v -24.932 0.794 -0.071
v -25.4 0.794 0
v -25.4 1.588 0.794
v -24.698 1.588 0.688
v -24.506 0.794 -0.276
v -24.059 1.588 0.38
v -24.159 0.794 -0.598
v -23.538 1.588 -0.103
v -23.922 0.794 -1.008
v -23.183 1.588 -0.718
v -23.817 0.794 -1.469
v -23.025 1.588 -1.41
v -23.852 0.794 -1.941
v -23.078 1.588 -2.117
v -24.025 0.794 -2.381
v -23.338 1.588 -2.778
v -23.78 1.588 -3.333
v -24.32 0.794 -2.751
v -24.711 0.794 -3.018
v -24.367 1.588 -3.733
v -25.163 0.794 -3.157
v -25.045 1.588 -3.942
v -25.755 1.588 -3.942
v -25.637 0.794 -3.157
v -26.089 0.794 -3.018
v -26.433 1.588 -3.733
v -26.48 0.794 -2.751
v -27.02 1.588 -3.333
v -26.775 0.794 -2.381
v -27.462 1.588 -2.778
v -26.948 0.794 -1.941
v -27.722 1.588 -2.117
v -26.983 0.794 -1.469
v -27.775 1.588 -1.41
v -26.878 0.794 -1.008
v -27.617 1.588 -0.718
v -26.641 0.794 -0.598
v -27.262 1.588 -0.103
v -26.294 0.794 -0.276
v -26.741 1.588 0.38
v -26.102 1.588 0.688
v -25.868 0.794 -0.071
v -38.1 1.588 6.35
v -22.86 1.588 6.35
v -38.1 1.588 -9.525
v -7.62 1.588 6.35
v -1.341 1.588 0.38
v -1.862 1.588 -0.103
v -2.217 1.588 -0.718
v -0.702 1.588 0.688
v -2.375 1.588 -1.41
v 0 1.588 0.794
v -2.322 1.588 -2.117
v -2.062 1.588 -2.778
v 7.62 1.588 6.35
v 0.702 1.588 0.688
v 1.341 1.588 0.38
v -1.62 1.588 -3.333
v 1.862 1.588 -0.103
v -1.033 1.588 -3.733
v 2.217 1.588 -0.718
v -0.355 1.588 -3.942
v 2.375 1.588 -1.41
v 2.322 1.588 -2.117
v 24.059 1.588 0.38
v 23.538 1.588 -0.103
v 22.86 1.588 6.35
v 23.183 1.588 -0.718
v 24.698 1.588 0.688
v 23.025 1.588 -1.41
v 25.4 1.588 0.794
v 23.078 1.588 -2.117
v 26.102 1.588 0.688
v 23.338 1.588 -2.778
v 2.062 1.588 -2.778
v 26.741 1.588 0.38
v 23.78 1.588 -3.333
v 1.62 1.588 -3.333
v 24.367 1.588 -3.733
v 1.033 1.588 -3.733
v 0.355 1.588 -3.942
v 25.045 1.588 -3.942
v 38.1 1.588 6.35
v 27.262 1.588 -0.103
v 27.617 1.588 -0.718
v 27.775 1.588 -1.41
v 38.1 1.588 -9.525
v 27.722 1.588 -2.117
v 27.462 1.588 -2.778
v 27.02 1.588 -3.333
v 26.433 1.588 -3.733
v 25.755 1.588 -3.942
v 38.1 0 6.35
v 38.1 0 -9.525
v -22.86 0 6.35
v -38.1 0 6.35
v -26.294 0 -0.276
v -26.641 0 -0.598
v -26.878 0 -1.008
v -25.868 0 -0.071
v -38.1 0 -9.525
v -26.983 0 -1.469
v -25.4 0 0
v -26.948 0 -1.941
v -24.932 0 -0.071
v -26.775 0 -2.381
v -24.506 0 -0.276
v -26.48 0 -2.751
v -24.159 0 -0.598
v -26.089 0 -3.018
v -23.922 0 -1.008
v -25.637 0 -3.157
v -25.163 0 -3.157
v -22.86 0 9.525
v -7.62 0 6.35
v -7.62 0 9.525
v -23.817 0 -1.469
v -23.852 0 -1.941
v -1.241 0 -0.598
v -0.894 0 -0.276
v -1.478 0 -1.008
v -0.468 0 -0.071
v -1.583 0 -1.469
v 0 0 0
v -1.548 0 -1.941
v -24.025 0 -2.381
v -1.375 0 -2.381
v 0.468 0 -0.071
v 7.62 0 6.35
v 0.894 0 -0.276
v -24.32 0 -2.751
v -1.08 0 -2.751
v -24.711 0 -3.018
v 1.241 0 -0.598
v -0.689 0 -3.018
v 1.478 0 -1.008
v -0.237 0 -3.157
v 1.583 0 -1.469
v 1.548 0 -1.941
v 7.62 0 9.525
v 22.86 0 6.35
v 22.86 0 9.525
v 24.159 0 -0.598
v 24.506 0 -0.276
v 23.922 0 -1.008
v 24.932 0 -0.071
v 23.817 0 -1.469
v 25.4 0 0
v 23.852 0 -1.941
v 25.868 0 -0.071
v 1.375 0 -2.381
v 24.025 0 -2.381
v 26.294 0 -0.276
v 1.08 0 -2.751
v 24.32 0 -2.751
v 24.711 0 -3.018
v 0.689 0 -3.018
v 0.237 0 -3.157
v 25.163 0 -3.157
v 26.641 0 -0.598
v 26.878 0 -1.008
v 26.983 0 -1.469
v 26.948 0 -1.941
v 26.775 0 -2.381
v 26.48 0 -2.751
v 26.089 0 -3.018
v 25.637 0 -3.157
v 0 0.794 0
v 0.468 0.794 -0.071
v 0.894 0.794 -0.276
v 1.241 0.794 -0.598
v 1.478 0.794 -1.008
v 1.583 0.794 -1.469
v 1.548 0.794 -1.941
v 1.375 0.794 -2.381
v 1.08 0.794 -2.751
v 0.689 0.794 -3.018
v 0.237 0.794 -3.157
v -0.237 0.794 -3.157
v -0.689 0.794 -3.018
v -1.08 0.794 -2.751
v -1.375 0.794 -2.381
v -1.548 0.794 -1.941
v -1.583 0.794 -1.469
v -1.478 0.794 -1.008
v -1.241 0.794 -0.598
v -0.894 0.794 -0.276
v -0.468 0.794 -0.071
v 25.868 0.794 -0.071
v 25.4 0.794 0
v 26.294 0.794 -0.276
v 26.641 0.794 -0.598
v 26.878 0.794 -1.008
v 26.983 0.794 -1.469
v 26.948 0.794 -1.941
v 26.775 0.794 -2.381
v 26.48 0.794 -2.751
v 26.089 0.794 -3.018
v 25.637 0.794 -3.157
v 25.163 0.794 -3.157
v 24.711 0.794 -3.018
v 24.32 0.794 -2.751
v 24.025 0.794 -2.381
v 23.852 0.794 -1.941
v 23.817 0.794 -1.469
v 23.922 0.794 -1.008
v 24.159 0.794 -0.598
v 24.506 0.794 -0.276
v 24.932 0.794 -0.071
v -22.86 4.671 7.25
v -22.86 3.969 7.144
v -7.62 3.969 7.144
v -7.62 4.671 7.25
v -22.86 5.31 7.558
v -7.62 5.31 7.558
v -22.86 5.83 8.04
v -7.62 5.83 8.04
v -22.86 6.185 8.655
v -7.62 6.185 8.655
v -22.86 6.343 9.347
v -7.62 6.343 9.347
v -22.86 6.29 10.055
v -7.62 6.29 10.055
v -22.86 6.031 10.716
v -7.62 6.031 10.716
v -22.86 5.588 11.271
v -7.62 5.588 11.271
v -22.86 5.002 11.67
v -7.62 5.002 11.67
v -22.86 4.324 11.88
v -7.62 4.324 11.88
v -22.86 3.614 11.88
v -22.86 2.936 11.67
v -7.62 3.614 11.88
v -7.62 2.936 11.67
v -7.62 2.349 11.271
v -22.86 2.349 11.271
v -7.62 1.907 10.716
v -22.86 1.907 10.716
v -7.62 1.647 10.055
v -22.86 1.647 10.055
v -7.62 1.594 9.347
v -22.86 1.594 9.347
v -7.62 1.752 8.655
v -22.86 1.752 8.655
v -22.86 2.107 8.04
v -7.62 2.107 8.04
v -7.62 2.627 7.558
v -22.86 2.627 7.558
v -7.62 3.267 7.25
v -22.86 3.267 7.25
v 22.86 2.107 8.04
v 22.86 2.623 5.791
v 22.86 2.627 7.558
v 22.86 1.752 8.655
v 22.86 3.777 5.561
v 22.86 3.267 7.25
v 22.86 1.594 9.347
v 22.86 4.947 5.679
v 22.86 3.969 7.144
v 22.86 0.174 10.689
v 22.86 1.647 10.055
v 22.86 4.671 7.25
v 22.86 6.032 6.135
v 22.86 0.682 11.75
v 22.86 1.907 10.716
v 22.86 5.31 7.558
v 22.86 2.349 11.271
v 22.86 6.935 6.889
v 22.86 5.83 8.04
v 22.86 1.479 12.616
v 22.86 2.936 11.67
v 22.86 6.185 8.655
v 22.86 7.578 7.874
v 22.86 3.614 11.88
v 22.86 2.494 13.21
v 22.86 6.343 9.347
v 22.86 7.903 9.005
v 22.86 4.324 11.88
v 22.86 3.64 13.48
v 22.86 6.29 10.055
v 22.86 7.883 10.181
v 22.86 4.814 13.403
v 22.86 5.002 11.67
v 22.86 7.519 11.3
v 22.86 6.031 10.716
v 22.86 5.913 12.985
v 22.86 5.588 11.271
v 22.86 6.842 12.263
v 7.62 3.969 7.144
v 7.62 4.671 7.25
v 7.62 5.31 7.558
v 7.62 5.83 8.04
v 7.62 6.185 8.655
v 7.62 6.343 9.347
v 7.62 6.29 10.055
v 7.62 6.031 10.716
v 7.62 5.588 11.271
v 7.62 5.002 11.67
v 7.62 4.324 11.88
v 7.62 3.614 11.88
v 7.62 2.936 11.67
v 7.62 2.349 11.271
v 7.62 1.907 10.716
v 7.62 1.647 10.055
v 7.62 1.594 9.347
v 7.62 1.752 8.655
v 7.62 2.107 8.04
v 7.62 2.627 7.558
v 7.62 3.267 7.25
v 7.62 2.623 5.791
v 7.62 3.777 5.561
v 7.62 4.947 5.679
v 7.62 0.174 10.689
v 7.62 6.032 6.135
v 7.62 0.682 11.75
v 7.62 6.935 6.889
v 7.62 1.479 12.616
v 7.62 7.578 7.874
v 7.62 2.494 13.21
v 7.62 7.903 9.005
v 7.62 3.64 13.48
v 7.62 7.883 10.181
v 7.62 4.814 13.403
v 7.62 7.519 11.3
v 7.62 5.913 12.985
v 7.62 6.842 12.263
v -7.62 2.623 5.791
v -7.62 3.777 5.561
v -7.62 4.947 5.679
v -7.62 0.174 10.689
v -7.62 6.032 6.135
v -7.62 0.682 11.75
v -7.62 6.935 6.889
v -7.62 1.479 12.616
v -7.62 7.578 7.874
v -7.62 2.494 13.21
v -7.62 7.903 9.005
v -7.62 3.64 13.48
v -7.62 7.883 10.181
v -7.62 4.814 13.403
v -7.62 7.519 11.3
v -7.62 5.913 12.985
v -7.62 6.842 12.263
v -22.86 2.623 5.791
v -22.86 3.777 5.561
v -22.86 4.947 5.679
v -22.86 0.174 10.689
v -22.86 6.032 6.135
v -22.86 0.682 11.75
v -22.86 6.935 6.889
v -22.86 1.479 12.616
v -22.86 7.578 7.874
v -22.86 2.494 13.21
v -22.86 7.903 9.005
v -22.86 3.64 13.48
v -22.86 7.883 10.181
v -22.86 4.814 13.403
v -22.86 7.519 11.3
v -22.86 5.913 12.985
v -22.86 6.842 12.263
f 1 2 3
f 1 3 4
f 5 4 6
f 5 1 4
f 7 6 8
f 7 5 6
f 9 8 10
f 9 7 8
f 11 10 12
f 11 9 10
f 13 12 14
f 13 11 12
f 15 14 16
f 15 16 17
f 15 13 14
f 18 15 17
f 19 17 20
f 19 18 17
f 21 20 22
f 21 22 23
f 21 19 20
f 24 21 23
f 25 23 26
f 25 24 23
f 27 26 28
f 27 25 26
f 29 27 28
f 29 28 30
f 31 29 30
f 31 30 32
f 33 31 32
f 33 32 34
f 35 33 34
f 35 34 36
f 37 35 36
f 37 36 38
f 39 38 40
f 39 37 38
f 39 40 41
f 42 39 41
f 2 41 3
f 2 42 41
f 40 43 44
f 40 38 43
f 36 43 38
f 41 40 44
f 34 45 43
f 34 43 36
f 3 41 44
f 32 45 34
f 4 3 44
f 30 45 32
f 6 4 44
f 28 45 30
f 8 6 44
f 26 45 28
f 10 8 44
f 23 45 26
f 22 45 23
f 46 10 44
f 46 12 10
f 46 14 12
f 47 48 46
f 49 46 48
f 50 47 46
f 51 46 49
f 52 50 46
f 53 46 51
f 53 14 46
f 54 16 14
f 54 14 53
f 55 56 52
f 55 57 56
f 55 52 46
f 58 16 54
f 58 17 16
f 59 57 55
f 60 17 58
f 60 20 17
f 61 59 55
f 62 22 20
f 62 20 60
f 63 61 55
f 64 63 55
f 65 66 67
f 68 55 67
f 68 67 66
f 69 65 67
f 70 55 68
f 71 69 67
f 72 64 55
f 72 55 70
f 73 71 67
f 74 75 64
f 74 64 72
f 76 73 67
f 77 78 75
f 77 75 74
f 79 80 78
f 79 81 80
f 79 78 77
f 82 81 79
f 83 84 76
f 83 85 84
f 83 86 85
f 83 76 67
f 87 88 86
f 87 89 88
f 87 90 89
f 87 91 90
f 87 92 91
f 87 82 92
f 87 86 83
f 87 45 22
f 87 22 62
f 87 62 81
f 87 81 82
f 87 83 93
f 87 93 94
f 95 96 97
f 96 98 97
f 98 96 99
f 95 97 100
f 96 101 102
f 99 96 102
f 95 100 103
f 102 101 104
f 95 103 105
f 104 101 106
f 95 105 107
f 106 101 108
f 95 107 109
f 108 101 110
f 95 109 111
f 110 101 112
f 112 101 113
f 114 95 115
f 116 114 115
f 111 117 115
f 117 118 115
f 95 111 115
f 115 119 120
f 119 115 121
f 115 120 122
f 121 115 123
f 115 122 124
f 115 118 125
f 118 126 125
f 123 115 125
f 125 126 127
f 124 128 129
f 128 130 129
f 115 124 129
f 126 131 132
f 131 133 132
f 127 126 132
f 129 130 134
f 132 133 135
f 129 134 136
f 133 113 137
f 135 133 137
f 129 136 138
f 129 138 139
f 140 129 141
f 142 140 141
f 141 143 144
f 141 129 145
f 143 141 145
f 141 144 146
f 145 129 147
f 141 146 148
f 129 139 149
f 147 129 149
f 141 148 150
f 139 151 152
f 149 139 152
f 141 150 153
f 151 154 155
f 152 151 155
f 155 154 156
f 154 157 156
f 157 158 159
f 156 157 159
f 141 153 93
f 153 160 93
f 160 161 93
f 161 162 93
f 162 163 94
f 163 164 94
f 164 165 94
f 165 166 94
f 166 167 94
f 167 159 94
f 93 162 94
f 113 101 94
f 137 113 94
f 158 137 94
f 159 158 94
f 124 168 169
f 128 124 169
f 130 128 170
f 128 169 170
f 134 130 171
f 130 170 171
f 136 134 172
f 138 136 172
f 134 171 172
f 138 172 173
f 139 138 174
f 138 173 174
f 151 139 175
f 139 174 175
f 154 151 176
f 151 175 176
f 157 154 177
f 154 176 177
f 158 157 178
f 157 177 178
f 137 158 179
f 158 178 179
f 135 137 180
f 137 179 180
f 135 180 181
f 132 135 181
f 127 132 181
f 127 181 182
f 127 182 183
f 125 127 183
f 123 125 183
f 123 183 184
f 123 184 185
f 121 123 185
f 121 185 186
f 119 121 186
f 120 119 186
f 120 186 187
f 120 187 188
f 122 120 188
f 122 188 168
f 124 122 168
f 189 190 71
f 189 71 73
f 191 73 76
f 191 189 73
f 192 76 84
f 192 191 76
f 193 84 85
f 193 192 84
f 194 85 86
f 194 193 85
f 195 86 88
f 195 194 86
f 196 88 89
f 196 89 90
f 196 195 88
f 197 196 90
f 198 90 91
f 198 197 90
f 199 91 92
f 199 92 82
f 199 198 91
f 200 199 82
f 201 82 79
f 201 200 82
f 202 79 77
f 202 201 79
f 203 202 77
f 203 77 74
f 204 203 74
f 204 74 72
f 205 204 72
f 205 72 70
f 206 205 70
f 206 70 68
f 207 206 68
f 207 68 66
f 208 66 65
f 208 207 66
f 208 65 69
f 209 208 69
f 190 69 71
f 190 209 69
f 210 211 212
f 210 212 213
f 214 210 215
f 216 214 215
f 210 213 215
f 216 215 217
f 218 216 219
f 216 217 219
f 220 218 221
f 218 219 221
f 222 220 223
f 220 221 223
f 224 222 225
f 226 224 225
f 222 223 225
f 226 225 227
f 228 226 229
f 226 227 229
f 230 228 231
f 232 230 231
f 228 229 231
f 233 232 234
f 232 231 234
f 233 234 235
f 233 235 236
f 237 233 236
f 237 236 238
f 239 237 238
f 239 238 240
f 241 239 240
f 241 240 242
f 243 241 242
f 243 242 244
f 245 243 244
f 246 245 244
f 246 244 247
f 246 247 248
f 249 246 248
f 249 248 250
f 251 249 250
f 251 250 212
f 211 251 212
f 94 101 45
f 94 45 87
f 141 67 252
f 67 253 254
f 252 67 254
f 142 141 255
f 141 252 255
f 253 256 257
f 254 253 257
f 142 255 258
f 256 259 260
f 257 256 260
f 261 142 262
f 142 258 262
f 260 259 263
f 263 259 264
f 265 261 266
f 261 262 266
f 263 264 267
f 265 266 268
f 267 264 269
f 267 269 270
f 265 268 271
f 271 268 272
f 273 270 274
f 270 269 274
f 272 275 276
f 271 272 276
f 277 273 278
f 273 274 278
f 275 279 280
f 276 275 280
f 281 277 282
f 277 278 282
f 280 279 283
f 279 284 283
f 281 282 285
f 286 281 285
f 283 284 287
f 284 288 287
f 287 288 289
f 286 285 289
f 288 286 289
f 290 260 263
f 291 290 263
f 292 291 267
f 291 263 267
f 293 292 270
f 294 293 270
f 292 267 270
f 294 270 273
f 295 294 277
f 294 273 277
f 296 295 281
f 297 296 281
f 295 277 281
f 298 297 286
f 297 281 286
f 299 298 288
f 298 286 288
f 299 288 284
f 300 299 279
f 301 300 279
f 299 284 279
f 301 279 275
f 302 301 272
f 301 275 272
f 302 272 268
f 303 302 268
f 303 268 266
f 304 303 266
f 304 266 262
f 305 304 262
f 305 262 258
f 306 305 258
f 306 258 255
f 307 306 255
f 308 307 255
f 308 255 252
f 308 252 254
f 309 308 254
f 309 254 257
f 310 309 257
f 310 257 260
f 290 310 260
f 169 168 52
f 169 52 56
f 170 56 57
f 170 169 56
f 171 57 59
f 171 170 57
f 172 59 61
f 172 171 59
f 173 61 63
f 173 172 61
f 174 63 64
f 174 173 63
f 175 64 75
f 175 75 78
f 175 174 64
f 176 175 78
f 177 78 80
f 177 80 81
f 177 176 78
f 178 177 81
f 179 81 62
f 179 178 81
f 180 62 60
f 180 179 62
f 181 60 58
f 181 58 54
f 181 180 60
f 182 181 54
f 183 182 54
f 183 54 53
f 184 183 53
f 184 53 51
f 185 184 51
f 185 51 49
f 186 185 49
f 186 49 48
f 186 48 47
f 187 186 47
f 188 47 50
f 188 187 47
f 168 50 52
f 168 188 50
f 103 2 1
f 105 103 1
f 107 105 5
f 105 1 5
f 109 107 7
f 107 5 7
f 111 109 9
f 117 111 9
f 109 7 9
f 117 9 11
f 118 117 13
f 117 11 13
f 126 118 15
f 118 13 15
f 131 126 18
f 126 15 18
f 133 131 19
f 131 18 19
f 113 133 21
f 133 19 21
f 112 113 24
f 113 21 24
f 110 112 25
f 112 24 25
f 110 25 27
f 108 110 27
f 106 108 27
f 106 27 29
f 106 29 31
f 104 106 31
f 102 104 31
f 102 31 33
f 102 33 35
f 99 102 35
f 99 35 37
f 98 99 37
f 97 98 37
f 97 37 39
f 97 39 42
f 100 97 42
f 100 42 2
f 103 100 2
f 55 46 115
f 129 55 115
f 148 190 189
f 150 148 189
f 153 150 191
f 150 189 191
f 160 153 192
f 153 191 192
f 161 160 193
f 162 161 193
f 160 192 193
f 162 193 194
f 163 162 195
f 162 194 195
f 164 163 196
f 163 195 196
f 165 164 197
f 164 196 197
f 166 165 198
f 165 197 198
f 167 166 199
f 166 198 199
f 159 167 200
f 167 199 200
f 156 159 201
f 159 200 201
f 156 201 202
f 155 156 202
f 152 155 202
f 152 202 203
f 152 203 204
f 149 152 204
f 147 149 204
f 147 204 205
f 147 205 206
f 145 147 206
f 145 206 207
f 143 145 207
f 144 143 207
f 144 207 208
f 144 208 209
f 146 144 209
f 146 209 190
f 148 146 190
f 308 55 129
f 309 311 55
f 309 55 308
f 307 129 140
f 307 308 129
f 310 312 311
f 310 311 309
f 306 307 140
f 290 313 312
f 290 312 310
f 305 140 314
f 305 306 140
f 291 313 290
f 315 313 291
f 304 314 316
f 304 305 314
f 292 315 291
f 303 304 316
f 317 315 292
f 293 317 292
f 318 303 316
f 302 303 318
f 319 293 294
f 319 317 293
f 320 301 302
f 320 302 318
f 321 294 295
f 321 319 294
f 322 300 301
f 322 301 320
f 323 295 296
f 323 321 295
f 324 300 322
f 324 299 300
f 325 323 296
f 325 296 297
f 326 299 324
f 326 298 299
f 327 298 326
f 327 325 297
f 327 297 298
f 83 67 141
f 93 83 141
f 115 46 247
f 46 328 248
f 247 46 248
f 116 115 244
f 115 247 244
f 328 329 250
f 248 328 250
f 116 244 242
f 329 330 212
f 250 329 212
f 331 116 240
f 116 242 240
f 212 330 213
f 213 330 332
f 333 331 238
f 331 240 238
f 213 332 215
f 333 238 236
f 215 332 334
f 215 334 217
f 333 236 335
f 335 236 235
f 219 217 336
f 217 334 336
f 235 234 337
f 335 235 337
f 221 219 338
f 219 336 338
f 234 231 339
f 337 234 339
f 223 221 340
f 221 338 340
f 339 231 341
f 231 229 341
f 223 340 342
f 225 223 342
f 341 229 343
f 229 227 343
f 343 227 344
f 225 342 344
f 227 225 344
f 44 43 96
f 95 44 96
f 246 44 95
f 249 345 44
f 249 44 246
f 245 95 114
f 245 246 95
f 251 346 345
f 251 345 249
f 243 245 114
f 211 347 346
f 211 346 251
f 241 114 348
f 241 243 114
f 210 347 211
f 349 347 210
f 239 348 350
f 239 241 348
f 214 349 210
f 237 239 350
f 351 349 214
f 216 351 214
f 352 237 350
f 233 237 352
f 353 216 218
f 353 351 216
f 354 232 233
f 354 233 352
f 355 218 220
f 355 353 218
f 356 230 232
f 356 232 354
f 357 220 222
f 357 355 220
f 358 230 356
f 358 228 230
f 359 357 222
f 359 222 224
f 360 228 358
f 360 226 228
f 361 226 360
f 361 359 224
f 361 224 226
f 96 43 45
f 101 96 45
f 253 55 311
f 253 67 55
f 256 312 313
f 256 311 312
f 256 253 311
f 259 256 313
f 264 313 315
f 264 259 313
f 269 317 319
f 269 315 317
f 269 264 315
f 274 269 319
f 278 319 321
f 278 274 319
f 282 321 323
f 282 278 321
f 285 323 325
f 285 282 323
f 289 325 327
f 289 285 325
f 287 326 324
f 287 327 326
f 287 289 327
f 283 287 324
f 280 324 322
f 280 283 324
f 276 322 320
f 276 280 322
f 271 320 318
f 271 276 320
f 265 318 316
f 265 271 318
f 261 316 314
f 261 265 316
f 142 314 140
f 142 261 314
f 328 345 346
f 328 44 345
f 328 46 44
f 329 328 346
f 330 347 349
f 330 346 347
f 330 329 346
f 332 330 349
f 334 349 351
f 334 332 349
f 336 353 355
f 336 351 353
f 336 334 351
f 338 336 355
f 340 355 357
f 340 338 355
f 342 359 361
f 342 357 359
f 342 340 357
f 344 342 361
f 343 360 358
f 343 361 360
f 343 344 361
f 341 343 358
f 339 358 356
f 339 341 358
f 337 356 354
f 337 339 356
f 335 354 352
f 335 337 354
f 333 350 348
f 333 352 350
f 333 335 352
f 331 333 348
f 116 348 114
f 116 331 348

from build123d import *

# Parameters (mm, degrees)
SKETCH1_W                  = 76.2
SKETCH1_H                  = 19.05
BOSS_EXTRUDE1_DEPTH        = 1.5875
SKETCH2_R                  = 3.96875
SKETCH2_R_2                = 2.38125
BOSS_EXTRUDE2_DEPTH        = 76.2
SKETCH4_R                  = 1.5875
CUT_EXTRUDE1_DEPTH         = 41.914713601
CHAMFER1_SIZE              = 0.79375
LPATTERN1_COUNT            = 3
LPATTERN1_PITCH            = 25.4
CHAMFER1_OF_LPATTERN1_SIZE = 0.79375
CUT_EXTRUDE2_DEPTH         = 15.24
LPATTERN2_COUNT            = 5
LPATTERN2_PITCH            = 15.24


with BuildPart() as part:
    # Sketch1 → Boss-Extrude1 (new body)
    with BuildSketch(Plane(origin=(0, 0, 0), x_dir=(1, 0, 0), z_dir=(0, 1, 0))):
        Rectangle(SKETCH1_W, SKETCH1_H)
    extrude(amount=BOSS_EXTRUDE1_DEPTH)

    # Sketch2 → Boss-Extrude2 (add)
    with BuildSketch(Plane(origin=(38.1, 0, 0), x_dir=(0, 0, -1), z_dir=(1, 0, 0))):
        with Locations((-9.525, 3.96875)):
            Circle(SKETCH2_R)
        with Locations((-9.525, 3.96875)):
            Circle(SKETCH2_R_2, mode=Mode.SUBTRACT)
    extrude(amount=-BOSS_EXTRUDE2_DEPTH)

    # Sketch4 → Cut-Extrude1 (cut, through all)
    with BuildSketch(Plane(origin=(0, 1.5875, 0), x_dir=(1, 0, 0), z_dir=(0, 1, 0))):
        with Locations(Location((-25.4, 1.5875, 0), (0, 0, 270))):
            Circle(SKETCH4_R)
    cut_extrude1 = extrude(amount=-CUT_EXTRUDE1_DEPTH, mode=Mode.SUBTRACT)

    # Chamfer1
    chamfer1_edges = [part.edges().sort_by_distance(p)[0] for p in [
        (-25.4, 1.5875, -3.175),
    ]]
    chamfer(chamfer1_edges, length=CHAMFER1_SIZE)

    # LPattern1: Cut-Extrude1 ×3
    with Locations(*[(i * LPATTERN1_PITCH, 0, 0) for i in range(1, LPATTERN1_COUNT)]):
        add(cut_extrude1, mode=Mode.SUBTRACT)

    # Chamfer1 of LPattern1
    chamfer1_of_lpattern1_edges = [part.edges().sort_by_distance(p)[0] for p in [
        (0, 1.5875, -3.175),
        (25.4, 1.5875, -3.175),
    ]]
    chamfer(chamfer1_of_lpattern1_edges, length=CHAMFER1_OF_LPATTERN1_SIZE)

    # Sketch5 → Cut-Extrude2 (cut)
    with BuildSketch(Plane(origin=(38.1, 0, 0), x_dir=(0, 0, -1), z_dir=(1, 0, 0))):
        with BuildLine():
            Line((-6.35, 1.5875), (-6.35, 0))
            Line((-6.35, 0), (-9.525, 0))
            ThreePointArc((-9.525, 0), (-11.299878957, 7.518507914), (-6.35, 1.5875))
        make_face()
    cut_extrude2 = extrude(amount=-CUT_EXTRUDE2_DEPTH, mode=Mode.SUBTRACT)

    # LPattern2: Cut-Extrude2 ×5, 2 skipped
    with Locations(*[(-i * LPATTERN2_PITCH, 0, 0) for i in range(1, LPATTERN2_COUNT) if i not in (1, 3)]):
        add(cut_extrude2, mode=Mode.SUBTRACT)


solid = part.part
